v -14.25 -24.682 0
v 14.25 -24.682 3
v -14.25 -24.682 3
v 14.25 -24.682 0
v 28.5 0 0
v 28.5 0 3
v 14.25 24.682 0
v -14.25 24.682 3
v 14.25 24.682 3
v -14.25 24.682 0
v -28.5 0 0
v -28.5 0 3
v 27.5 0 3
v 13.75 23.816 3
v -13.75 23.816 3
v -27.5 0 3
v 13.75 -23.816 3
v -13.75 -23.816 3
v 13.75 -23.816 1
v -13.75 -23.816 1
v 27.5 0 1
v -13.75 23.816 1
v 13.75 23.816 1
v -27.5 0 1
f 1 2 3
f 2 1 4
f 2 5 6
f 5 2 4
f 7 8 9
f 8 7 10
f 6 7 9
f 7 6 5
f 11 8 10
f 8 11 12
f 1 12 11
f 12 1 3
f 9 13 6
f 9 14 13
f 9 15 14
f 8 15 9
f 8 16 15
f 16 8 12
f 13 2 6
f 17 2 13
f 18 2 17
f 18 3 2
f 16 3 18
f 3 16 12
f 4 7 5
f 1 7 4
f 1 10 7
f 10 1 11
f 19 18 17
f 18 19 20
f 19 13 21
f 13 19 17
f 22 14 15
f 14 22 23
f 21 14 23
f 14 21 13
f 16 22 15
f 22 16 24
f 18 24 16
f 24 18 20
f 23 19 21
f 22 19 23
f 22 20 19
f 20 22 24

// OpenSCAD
$fn = 150;

difference() {
	cylinder($fn = 6, d = 57.0, h = 3.0);
	translate(v = [0, 0, 1.0]) {
		cylinder($fn = 6, d = 55.0, h = 3.0);
	}
}
